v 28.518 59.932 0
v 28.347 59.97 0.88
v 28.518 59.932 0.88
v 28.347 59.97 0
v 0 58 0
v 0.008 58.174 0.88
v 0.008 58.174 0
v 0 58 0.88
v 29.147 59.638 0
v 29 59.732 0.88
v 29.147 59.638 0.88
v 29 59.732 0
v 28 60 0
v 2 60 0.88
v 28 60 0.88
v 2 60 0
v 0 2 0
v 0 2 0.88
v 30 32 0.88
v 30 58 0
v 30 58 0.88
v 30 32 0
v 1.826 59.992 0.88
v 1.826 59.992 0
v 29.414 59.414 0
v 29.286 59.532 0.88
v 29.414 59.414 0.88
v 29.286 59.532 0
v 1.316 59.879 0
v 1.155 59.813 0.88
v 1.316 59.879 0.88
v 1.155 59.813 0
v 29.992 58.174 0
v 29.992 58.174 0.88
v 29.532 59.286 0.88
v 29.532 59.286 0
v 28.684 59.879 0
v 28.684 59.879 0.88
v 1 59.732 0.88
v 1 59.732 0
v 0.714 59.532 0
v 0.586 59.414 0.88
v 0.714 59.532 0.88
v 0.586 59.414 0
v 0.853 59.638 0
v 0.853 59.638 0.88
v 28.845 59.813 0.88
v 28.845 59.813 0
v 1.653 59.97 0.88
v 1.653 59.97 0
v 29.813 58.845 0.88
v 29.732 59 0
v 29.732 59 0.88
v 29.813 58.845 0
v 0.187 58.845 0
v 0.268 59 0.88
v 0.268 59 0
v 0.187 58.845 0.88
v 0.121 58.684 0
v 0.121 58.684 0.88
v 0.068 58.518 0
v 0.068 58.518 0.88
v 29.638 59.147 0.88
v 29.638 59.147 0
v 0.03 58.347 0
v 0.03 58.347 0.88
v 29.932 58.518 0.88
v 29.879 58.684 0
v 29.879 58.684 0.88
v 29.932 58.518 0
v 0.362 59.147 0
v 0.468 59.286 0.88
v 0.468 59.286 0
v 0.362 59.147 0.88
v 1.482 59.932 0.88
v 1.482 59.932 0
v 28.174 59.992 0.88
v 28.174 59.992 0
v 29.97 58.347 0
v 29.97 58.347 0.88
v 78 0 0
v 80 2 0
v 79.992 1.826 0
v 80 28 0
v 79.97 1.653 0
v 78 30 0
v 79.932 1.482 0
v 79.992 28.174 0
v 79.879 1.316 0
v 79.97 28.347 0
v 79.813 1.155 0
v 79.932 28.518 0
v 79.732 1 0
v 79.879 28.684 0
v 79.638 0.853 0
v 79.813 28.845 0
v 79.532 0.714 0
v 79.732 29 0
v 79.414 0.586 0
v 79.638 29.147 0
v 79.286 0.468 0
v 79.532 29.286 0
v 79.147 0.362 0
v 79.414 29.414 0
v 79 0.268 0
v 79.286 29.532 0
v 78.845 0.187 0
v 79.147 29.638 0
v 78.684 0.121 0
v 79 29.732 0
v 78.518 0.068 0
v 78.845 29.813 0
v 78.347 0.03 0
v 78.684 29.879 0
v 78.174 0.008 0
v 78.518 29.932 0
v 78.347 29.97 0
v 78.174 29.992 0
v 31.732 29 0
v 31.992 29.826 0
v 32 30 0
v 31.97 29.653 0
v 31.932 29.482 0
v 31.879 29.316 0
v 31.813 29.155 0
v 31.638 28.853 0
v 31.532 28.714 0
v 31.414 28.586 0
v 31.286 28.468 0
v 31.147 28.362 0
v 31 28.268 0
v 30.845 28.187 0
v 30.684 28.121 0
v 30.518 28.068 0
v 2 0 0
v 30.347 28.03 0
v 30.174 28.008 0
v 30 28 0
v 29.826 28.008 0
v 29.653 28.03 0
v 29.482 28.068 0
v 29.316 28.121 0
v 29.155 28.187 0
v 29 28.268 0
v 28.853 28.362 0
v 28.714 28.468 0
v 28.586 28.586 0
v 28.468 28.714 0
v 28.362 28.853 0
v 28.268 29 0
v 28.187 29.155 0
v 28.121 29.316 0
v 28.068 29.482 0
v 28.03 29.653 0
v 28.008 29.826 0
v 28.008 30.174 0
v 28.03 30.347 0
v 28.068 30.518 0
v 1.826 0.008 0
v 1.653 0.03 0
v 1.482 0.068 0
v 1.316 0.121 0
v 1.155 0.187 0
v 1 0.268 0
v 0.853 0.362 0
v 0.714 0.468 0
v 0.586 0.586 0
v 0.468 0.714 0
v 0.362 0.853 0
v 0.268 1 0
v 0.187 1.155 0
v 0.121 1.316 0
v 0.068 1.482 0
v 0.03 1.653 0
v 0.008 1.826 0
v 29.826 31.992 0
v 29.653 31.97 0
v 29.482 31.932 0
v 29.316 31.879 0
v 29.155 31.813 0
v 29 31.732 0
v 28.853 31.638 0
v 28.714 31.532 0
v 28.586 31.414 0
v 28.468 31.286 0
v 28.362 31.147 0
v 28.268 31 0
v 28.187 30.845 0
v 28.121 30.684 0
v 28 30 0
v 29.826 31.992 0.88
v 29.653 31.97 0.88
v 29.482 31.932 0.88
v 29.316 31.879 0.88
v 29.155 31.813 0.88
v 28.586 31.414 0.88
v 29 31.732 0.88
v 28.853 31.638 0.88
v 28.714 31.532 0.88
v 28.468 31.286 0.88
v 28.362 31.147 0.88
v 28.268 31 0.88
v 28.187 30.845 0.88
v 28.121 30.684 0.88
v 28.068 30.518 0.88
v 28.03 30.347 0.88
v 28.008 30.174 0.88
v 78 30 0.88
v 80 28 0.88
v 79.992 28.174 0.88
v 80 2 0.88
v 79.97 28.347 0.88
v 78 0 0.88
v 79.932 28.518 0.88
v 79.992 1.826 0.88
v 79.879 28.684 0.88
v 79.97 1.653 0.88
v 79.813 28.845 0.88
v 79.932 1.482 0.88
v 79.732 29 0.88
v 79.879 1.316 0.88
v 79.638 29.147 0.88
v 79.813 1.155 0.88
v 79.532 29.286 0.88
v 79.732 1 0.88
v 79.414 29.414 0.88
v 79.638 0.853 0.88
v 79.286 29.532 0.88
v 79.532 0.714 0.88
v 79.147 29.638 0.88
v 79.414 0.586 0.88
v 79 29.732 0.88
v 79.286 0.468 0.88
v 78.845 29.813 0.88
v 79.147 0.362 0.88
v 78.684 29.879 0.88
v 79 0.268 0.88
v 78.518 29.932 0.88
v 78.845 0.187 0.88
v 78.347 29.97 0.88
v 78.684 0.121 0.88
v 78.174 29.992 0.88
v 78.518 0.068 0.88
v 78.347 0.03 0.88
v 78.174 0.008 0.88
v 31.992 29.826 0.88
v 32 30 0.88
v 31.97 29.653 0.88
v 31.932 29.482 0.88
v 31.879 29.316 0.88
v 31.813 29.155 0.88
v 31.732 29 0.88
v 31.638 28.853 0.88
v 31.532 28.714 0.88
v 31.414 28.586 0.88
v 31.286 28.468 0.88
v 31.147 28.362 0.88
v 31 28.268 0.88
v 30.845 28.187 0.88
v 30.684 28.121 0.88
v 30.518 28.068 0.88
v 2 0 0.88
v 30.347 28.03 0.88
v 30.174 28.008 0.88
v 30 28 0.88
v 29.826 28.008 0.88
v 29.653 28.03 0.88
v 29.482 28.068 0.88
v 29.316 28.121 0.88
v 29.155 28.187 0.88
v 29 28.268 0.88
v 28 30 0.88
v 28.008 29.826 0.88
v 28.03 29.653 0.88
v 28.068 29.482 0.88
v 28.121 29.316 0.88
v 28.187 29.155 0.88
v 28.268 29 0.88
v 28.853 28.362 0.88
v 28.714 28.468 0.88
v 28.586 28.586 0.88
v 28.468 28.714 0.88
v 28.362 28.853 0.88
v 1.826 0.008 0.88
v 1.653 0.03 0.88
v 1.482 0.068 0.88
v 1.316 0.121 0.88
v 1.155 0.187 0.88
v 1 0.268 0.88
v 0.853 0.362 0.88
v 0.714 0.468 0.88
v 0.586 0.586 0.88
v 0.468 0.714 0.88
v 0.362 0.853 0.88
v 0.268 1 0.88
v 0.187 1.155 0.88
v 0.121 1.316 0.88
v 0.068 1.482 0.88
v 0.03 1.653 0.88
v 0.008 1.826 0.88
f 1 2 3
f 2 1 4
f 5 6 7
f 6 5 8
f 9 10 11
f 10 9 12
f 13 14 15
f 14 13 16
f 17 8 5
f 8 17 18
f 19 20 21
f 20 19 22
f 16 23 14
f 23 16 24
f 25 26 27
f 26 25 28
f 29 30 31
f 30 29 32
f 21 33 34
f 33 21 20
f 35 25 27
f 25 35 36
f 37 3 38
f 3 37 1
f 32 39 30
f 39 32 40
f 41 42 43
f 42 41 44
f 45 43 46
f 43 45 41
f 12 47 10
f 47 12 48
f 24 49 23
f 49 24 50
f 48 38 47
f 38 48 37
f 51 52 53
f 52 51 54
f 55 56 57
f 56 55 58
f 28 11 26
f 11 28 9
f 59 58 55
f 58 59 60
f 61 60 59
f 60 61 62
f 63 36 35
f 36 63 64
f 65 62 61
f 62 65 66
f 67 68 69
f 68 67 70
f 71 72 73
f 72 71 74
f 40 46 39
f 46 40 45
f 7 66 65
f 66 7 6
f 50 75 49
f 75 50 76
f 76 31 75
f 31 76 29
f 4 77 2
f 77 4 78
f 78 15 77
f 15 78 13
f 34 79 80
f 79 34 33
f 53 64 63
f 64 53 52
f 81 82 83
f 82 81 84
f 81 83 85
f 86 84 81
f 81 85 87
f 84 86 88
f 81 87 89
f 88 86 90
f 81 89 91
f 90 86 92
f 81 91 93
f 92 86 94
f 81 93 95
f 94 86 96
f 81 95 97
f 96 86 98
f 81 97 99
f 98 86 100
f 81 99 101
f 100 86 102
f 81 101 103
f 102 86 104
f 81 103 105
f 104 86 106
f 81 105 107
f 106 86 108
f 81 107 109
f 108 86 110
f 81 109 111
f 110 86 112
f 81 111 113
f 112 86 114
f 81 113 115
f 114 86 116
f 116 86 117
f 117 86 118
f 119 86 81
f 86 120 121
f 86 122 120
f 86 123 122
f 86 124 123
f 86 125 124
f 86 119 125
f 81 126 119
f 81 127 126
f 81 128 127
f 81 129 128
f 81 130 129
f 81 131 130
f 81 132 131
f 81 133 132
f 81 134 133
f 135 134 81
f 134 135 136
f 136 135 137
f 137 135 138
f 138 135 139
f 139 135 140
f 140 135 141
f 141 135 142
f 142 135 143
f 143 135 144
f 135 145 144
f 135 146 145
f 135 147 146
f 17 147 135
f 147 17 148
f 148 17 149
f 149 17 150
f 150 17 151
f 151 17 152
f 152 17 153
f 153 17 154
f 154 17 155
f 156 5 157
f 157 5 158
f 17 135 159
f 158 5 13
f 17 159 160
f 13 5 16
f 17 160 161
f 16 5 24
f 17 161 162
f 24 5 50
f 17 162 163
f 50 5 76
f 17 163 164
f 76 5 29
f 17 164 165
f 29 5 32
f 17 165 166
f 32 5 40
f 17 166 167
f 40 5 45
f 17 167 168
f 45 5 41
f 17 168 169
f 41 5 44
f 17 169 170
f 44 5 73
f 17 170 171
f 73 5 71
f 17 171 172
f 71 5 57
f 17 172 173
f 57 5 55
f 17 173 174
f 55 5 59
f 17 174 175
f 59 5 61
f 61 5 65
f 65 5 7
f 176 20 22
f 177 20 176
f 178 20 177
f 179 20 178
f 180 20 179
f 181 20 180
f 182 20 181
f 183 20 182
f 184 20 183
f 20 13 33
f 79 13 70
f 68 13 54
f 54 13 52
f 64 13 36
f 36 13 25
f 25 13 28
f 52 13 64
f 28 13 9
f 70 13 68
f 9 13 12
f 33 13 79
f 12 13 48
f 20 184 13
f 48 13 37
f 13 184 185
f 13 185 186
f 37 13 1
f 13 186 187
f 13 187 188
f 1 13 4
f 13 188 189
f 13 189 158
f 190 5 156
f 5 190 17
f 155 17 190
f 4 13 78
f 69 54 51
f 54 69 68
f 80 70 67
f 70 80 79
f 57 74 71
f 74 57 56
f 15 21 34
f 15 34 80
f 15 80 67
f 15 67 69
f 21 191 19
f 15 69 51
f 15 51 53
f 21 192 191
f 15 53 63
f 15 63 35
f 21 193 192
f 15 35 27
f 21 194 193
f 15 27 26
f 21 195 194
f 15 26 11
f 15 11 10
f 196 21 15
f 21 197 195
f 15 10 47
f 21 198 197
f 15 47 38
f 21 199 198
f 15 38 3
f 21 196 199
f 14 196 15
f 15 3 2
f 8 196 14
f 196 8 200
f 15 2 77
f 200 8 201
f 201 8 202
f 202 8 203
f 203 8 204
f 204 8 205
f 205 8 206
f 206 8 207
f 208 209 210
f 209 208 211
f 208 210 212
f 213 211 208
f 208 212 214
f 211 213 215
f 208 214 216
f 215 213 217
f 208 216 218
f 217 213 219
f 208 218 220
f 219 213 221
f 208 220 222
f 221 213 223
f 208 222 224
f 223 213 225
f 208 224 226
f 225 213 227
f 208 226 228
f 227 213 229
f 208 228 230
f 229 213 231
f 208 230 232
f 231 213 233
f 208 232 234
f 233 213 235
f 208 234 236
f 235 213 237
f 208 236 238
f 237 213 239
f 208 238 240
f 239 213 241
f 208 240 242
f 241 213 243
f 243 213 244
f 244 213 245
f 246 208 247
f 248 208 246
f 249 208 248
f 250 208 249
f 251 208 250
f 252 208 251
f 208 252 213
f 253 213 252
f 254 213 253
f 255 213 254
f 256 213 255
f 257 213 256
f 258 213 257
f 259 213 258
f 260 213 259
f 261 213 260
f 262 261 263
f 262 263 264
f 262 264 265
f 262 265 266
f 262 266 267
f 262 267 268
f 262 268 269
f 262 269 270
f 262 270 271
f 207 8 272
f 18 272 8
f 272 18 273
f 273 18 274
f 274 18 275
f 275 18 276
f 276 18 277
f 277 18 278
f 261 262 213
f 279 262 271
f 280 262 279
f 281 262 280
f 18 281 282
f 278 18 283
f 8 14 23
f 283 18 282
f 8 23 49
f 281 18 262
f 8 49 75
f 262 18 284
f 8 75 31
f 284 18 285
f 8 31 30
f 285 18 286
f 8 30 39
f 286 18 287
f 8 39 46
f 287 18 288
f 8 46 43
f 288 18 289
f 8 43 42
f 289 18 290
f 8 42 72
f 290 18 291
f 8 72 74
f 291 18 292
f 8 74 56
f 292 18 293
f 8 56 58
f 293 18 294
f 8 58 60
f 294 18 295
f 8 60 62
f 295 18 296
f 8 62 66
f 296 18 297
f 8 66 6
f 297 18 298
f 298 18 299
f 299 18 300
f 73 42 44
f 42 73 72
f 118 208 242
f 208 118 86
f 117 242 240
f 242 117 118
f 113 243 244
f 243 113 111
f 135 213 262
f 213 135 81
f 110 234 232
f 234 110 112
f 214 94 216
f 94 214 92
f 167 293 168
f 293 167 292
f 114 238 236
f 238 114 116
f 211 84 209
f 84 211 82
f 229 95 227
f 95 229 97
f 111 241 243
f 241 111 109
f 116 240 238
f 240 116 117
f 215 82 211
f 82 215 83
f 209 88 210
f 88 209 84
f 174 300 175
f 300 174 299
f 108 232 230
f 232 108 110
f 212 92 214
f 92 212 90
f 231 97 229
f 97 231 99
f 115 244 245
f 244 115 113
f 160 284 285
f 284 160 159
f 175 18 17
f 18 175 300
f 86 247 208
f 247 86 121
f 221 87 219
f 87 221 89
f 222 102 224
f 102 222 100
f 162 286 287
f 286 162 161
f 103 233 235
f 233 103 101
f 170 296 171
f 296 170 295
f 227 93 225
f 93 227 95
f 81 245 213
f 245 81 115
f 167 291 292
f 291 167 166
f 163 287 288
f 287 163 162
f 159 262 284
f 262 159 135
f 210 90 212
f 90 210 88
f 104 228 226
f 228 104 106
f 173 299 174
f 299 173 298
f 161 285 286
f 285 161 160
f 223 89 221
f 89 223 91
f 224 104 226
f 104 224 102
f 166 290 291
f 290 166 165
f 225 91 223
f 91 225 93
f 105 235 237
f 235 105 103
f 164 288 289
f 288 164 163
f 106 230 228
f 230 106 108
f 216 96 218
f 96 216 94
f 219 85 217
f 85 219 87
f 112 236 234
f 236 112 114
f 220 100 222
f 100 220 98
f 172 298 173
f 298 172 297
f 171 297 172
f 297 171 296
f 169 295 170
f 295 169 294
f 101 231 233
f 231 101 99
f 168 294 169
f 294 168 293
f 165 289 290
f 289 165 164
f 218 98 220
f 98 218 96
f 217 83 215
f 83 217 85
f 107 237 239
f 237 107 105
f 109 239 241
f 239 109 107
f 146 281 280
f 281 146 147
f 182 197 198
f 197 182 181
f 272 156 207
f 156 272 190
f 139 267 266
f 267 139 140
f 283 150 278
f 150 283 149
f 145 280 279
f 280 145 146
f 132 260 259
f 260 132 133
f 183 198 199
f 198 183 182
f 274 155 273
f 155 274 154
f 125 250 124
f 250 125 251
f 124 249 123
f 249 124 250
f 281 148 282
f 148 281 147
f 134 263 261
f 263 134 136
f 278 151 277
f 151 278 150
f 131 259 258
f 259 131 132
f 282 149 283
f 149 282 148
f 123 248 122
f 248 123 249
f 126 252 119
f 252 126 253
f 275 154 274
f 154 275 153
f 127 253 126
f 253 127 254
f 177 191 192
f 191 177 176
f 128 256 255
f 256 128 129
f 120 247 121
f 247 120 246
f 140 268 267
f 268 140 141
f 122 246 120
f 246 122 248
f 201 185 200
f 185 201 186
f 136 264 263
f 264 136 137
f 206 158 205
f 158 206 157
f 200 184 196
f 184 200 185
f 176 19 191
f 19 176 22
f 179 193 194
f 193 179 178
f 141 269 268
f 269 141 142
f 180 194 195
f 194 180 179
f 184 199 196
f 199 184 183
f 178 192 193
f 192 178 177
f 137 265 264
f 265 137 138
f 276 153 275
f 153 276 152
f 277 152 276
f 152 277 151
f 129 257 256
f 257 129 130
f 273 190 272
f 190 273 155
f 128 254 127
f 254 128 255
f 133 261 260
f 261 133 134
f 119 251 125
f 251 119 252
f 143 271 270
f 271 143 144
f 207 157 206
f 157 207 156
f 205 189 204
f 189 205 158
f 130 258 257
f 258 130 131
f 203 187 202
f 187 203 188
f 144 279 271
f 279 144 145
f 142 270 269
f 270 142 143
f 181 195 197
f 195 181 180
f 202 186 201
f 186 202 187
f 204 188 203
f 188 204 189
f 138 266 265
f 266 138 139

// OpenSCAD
// OpenScad L shape parmetric bracket for printing PCBs with solder
// paste stencils. Similar to the ones shown at 
// http://www.sunstone.com/pcb-products/pcb-solder-stencils/how-to-use 
// but it's parametric to you can adapt to your size and thickness.
// 
// Circle roundness. Higher is smoother but slower to compile.
$fn=72;

// Adjust match the thickness of the PCB. The actual printed thickness
// depends on your slicer and printer.
//thickness = 0.8;
//thickness = 1.0;
thickness = 0.88;  // results in 1.1mm thickness with my printing process.
//thickness = 1.6;
//thickness = 2.0;

// The inner lengths and width of the arm along the x axis.
xlength = 50;
xwidth = 30;

// The inner lengths and width of first arm along the y axis
ylength = 30;
ywidth = 30;

// The radius of the rounded corners.
corner_radius=2;

// The raius of the corner clearance hole.
hole_radius = 2;

// Small distances. Used to make sure relationship between
// shapes are well defined. Do not effect dimensions of main object.
eps = 0.001;
eps2 = 2*eps;

// A simple L shape.
module l_shape(xl, yl, zl, xw, yw) {
  difference() {
    cube([yw+xl, xw+yl, zl]);
    translate([yw, xw, -eps]) 
        cube([xl+eps, yl+eps, zl+eps2]);
  }
}

// A L shape with rounded corners.
module rounded_l_shape(xl, yl, zl, xw, yw, r) {
  translate([r, r, 0]) minkowski() {
    l_shape(xl, yl, zl/2, xw-2*r, yw-2*r);
    cylinder(r=r, h=zl/2);
  }  
}

// A L shape with rounded corners and center release hole.
module main_part() {
  difference() {
    rounded_l_shape(xlength, ylength, thickness, 
        xwidth, ywidth, corner_radius);
    translate([ywidth, xwidth, 0]) 
        cylinder(r=hole_radius, h=thickness+eps);
  }
}

main_part();
